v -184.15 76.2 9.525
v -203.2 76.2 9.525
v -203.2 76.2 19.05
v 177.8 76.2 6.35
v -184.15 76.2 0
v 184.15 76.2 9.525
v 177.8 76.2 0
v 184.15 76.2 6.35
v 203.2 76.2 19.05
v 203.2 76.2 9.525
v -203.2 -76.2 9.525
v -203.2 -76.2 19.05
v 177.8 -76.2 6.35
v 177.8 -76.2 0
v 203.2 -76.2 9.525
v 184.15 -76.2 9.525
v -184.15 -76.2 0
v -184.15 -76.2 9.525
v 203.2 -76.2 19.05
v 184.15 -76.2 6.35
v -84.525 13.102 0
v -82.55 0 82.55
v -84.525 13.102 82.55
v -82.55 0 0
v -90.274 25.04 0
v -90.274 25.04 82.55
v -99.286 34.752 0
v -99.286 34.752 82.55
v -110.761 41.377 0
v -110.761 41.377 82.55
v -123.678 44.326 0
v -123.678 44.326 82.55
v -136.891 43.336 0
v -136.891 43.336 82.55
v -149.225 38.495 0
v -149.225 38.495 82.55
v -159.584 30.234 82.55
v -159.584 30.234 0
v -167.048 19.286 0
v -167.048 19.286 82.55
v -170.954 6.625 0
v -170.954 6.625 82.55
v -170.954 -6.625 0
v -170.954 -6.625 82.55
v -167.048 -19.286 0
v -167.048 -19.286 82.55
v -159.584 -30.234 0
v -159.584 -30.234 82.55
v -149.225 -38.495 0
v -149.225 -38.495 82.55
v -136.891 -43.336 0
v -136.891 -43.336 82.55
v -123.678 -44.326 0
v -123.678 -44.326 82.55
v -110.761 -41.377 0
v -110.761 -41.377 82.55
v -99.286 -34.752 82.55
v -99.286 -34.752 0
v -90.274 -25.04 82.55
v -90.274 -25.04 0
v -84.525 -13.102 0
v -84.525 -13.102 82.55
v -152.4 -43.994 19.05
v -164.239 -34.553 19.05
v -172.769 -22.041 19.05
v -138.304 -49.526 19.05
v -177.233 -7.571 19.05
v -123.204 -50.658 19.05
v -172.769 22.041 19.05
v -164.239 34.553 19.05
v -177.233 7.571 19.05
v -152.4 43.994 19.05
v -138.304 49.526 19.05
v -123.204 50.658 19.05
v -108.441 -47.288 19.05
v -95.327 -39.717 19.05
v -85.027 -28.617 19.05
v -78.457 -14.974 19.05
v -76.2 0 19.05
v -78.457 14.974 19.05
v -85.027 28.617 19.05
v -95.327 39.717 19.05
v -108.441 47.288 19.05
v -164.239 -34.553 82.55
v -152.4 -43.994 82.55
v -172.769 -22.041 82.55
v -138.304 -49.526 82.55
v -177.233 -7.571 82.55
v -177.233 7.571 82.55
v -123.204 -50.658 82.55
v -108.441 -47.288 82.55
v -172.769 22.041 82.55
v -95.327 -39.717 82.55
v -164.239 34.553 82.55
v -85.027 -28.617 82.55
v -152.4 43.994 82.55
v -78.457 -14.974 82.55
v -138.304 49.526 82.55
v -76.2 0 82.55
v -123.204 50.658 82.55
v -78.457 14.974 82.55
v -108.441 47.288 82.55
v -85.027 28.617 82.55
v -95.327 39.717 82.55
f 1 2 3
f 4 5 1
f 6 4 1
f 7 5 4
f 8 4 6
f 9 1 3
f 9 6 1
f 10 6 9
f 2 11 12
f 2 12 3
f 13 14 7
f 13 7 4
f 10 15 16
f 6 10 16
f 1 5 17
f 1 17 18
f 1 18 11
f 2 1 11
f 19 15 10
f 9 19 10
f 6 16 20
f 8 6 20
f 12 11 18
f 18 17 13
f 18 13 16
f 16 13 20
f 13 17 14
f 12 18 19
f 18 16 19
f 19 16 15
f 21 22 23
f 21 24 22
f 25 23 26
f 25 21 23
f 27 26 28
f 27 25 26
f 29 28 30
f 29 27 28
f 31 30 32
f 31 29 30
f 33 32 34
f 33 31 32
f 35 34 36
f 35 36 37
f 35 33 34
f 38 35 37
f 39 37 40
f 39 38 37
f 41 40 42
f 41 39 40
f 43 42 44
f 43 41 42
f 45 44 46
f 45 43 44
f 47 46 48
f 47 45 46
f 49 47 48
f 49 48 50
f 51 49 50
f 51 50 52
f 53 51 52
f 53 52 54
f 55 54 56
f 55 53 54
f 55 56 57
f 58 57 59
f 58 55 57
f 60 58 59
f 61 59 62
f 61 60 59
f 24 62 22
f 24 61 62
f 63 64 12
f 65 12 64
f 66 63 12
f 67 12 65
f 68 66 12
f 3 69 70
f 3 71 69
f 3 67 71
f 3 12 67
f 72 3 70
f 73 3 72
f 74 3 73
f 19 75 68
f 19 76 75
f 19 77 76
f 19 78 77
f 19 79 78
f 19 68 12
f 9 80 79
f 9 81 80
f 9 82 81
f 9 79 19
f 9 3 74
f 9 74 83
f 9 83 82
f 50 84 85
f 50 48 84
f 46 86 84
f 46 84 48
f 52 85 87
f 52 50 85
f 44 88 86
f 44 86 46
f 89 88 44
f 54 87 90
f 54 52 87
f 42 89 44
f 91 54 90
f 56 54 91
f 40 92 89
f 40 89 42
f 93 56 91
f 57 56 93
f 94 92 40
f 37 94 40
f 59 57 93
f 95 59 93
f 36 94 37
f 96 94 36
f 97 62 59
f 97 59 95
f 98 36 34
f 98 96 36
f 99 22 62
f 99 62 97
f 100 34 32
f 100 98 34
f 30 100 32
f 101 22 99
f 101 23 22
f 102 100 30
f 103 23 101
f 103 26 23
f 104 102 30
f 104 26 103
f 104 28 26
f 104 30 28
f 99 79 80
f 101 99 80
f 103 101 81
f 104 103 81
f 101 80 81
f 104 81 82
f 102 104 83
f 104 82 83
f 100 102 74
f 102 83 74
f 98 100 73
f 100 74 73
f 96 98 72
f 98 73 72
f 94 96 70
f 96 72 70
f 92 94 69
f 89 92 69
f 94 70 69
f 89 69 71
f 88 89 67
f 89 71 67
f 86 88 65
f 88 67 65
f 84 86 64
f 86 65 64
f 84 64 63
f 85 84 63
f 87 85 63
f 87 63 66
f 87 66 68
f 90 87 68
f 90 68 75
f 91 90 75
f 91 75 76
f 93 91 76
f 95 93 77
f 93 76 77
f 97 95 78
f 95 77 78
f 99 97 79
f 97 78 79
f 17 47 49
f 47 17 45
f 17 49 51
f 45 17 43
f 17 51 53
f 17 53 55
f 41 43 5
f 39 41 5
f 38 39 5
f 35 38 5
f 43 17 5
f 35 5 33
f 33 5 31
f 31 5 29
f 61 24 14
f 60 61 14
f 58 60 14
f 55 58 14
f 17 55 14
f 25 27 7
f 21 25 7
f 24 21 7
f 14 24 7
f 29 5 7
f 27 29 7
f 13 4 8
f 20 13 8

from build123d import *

# Parameters (mm, degrees)
F0_W     = 406.4
F0_H     = 152.4
F1_DEPTH = 19.05
F2_W     = 6.35
F2_H     = 6.35
F3_DEPTH = 152.401
F4_R     = 44.45
F5_DEPTH = 19.051
F6_R     = 50.8
F6_R_2   = 44.45
F7_DEPTH = 63.5


with BuildPart() as f1:
    # F0 (on Top) → F1 (new body)
    with BuildSketch(Plane.XY):
        Rectangle(F0_W, F0_H)
    extrude(amount=F1_DEPTH)

    # F2 (on face) → F3 (cut, through all)
    with BuildSketch(Plane.XZ.offset(76.2)):
        Polygon((-203.2, 9.525), (-203.2, 0), (-184.15, 0), (-184.15, 6.35), (-184.15, 9.525), align=None)
        Polygon((184.15, 6.35), (184.15, 0), (203.2, 0), (203.2, 9.525), (184.15, 9.525), align=None)
        with Locations((180.975, 3.175)):
            Rectangle(F2_W, F2_H)
    extrude(amount=-F3_DEPTH, mode=Mode.SUBTRACT)

    # F4 (on face) → F5 (cut, through all)
    with BuildSketch(Plane(origin=(0, 0, 0), x_dir=(1, 0, 0), z_dir=(0, 0, -1))):
        with Locations((-127, 0)):
            Circle(F4_R)
    extrude(amount=-F5_DEPTH, mode=Mode.SUBTRACT)

    # F6 (on face) → F7 (join)
    with BuildSketch(Plane.XY.offset(19.05)):
        with Locations((-127, 0)):
            Circle(F6_R)
        with Locations((-127, 0)):
            Circle(F6_R_2, mode=Mode.SUBTRACT)
    extrude(amount=F7_DEPTH)


solid = f1.part
